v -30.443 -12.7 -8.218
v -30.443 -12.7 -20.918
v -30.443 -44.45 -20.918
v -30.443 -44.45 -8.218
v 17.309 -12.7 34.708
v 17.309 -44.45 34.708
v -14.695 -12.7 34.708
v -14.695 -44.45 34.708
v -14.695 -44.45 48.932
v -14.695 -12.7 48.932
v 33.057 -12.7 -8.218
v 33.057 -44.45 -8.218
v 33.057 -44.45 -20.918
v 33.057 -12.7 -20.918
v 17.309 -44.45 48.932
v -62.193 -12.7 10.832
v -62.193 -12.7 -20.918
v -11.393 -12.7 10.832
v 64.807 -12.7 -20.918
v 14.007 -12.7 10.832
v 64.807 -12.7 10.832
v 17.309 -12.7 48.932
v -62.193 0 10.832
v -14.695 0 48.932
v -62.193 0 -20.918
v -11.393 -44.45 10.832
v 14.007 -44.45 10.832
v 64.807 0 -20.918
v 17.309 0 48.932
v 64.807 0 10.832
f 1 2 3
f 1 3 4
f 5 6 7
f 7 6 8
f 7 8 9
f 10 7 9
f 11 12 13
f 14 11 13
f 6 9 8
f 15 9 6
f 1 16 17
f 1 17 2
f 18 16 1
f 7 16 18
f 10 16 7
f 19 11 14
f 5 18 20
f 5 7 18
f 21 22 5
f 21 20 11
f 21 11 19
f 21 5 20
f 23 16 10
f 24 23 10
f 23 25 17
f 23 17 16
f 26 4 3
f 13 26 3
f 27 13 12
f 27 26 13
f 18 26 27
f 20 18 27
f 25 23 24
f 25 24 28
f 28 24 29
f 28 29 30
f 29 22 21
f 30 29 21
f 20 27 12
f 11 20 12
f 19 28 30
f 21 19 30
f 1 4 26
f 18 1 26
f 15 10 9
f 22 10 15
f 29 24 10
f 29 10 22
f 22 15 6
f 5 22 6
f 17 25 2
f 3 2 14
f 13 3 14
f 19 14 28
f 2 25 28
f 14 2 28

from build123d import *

# Parameters (mm, degrees)
F0_W     = 127
F0_H     = 69.85
F1_DEPTH = 44.45
F3_DEPTH = 44.45
F5_DEPTH = 31.75


with BuildPart() as f1:
    # F0 (on Front) → F1 (new body)
    with BuildSketch(Plane.XZ):
        with Locations((1.307353, 14.007352)):
            Rectangle(F0_W, F0_H)
    extrude(amount=F1_DEPTH)

    # F2 (on face) → F3 (cut)
    with BuildSketch(Plane.XZ.offset(44.45)):
        Polygon((17.309353, 48.932352), (64.807353, 10.832352), (64.807353, 48.932352), align=None)
        Polygon((-62.192647, 48.932352), (-62.192647, 10.832352), (-14.694647, 48.932352), align=None)
    extrude(amount=-F3_DEPTH, mode=Mode.SUBTRACT)

    # F4 (on face) → F5 (cut)
    with BuildSketch(Plane.XZ.offset(44.45)):
        Polygon((64.807353, 10.832352), (17.309353, 48.932352), (17.309353, 34.708352), (-14.694647, 34.708352), (-14.694647, 48.932352), (-62.192647, 10.832352), (-62.192647, -20.917648), (-30.442647, -20.917648), (-30.442647, -8.217648), (-11.392647, 10.832352), (14.007353, 10.832352), (33.057353, -8.217648), (33.057353, -20.917648), (64.807353, -20.917648), align=None)
    extrude(amount=-F5_DEPTH, mode=Mode.SUBTRACT)


solid = f1.part
